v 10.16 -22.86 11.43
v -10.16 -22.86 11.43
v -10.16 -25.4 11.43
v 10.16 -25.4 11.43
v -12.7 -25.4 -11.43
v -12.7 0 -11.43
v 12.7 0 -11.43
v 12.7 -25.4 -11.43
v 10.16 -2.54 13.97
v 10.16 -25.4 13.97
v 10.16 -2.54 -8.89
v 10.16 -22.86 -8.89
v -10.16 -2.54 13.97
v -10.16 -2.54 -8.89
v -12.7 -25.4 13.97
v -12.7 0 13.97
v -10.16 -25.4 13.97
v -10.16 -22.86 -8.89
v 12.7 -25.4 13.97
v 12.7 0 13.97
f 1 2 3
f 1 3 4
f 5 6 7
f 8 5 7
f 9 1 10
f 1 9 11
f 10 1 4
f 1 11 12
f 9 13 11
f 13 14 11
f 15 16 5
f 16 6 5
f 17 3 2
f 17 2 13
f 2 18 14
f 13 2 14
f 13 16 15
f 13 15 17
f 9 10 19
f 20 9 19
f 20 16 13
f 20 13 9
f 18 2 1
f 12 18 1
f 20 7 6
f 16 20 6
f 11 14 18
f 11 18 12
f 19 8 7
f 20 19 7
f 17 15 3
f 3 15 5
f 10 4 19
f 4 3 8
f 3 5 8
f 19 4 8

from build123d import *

# Parameters (mm, degrees)
F0_W     = 25.4
F0_H     = 22.86
F1_DEPTH = 25.4
F2_T     = -2.54
F4_DEPTH = 2.54


with BuildPart() as f1:
    # F0 (on Front) → F1 (new body)
    with BuildSketch(Plane.XZ):
        Rectangle(F0_W, F0_H)
    extrude(amount=F1_DEPTH)

    # F2
    f2_openings = [f1.faces().sort_by_distance(p)[0] for p in [
        (0, -12.7, 11.43),
    ]]
    offset(amount=F2_T, openings=f2_openings)

    # F3 (on face) → F4 (join)
    with BuildSketch(Plane.XY.offset(11.43)):
        Polygon((12.7, 0), (-12.7, 0), (-12.7, -25.4), (-10.16, -25.4), (-10.16, -2.54), (10.16, -2.54), (10.16, -25.4), (12.7, -25.4), align=None)
    extrude(amount=F4_DEPTH)


solid = f1.part
